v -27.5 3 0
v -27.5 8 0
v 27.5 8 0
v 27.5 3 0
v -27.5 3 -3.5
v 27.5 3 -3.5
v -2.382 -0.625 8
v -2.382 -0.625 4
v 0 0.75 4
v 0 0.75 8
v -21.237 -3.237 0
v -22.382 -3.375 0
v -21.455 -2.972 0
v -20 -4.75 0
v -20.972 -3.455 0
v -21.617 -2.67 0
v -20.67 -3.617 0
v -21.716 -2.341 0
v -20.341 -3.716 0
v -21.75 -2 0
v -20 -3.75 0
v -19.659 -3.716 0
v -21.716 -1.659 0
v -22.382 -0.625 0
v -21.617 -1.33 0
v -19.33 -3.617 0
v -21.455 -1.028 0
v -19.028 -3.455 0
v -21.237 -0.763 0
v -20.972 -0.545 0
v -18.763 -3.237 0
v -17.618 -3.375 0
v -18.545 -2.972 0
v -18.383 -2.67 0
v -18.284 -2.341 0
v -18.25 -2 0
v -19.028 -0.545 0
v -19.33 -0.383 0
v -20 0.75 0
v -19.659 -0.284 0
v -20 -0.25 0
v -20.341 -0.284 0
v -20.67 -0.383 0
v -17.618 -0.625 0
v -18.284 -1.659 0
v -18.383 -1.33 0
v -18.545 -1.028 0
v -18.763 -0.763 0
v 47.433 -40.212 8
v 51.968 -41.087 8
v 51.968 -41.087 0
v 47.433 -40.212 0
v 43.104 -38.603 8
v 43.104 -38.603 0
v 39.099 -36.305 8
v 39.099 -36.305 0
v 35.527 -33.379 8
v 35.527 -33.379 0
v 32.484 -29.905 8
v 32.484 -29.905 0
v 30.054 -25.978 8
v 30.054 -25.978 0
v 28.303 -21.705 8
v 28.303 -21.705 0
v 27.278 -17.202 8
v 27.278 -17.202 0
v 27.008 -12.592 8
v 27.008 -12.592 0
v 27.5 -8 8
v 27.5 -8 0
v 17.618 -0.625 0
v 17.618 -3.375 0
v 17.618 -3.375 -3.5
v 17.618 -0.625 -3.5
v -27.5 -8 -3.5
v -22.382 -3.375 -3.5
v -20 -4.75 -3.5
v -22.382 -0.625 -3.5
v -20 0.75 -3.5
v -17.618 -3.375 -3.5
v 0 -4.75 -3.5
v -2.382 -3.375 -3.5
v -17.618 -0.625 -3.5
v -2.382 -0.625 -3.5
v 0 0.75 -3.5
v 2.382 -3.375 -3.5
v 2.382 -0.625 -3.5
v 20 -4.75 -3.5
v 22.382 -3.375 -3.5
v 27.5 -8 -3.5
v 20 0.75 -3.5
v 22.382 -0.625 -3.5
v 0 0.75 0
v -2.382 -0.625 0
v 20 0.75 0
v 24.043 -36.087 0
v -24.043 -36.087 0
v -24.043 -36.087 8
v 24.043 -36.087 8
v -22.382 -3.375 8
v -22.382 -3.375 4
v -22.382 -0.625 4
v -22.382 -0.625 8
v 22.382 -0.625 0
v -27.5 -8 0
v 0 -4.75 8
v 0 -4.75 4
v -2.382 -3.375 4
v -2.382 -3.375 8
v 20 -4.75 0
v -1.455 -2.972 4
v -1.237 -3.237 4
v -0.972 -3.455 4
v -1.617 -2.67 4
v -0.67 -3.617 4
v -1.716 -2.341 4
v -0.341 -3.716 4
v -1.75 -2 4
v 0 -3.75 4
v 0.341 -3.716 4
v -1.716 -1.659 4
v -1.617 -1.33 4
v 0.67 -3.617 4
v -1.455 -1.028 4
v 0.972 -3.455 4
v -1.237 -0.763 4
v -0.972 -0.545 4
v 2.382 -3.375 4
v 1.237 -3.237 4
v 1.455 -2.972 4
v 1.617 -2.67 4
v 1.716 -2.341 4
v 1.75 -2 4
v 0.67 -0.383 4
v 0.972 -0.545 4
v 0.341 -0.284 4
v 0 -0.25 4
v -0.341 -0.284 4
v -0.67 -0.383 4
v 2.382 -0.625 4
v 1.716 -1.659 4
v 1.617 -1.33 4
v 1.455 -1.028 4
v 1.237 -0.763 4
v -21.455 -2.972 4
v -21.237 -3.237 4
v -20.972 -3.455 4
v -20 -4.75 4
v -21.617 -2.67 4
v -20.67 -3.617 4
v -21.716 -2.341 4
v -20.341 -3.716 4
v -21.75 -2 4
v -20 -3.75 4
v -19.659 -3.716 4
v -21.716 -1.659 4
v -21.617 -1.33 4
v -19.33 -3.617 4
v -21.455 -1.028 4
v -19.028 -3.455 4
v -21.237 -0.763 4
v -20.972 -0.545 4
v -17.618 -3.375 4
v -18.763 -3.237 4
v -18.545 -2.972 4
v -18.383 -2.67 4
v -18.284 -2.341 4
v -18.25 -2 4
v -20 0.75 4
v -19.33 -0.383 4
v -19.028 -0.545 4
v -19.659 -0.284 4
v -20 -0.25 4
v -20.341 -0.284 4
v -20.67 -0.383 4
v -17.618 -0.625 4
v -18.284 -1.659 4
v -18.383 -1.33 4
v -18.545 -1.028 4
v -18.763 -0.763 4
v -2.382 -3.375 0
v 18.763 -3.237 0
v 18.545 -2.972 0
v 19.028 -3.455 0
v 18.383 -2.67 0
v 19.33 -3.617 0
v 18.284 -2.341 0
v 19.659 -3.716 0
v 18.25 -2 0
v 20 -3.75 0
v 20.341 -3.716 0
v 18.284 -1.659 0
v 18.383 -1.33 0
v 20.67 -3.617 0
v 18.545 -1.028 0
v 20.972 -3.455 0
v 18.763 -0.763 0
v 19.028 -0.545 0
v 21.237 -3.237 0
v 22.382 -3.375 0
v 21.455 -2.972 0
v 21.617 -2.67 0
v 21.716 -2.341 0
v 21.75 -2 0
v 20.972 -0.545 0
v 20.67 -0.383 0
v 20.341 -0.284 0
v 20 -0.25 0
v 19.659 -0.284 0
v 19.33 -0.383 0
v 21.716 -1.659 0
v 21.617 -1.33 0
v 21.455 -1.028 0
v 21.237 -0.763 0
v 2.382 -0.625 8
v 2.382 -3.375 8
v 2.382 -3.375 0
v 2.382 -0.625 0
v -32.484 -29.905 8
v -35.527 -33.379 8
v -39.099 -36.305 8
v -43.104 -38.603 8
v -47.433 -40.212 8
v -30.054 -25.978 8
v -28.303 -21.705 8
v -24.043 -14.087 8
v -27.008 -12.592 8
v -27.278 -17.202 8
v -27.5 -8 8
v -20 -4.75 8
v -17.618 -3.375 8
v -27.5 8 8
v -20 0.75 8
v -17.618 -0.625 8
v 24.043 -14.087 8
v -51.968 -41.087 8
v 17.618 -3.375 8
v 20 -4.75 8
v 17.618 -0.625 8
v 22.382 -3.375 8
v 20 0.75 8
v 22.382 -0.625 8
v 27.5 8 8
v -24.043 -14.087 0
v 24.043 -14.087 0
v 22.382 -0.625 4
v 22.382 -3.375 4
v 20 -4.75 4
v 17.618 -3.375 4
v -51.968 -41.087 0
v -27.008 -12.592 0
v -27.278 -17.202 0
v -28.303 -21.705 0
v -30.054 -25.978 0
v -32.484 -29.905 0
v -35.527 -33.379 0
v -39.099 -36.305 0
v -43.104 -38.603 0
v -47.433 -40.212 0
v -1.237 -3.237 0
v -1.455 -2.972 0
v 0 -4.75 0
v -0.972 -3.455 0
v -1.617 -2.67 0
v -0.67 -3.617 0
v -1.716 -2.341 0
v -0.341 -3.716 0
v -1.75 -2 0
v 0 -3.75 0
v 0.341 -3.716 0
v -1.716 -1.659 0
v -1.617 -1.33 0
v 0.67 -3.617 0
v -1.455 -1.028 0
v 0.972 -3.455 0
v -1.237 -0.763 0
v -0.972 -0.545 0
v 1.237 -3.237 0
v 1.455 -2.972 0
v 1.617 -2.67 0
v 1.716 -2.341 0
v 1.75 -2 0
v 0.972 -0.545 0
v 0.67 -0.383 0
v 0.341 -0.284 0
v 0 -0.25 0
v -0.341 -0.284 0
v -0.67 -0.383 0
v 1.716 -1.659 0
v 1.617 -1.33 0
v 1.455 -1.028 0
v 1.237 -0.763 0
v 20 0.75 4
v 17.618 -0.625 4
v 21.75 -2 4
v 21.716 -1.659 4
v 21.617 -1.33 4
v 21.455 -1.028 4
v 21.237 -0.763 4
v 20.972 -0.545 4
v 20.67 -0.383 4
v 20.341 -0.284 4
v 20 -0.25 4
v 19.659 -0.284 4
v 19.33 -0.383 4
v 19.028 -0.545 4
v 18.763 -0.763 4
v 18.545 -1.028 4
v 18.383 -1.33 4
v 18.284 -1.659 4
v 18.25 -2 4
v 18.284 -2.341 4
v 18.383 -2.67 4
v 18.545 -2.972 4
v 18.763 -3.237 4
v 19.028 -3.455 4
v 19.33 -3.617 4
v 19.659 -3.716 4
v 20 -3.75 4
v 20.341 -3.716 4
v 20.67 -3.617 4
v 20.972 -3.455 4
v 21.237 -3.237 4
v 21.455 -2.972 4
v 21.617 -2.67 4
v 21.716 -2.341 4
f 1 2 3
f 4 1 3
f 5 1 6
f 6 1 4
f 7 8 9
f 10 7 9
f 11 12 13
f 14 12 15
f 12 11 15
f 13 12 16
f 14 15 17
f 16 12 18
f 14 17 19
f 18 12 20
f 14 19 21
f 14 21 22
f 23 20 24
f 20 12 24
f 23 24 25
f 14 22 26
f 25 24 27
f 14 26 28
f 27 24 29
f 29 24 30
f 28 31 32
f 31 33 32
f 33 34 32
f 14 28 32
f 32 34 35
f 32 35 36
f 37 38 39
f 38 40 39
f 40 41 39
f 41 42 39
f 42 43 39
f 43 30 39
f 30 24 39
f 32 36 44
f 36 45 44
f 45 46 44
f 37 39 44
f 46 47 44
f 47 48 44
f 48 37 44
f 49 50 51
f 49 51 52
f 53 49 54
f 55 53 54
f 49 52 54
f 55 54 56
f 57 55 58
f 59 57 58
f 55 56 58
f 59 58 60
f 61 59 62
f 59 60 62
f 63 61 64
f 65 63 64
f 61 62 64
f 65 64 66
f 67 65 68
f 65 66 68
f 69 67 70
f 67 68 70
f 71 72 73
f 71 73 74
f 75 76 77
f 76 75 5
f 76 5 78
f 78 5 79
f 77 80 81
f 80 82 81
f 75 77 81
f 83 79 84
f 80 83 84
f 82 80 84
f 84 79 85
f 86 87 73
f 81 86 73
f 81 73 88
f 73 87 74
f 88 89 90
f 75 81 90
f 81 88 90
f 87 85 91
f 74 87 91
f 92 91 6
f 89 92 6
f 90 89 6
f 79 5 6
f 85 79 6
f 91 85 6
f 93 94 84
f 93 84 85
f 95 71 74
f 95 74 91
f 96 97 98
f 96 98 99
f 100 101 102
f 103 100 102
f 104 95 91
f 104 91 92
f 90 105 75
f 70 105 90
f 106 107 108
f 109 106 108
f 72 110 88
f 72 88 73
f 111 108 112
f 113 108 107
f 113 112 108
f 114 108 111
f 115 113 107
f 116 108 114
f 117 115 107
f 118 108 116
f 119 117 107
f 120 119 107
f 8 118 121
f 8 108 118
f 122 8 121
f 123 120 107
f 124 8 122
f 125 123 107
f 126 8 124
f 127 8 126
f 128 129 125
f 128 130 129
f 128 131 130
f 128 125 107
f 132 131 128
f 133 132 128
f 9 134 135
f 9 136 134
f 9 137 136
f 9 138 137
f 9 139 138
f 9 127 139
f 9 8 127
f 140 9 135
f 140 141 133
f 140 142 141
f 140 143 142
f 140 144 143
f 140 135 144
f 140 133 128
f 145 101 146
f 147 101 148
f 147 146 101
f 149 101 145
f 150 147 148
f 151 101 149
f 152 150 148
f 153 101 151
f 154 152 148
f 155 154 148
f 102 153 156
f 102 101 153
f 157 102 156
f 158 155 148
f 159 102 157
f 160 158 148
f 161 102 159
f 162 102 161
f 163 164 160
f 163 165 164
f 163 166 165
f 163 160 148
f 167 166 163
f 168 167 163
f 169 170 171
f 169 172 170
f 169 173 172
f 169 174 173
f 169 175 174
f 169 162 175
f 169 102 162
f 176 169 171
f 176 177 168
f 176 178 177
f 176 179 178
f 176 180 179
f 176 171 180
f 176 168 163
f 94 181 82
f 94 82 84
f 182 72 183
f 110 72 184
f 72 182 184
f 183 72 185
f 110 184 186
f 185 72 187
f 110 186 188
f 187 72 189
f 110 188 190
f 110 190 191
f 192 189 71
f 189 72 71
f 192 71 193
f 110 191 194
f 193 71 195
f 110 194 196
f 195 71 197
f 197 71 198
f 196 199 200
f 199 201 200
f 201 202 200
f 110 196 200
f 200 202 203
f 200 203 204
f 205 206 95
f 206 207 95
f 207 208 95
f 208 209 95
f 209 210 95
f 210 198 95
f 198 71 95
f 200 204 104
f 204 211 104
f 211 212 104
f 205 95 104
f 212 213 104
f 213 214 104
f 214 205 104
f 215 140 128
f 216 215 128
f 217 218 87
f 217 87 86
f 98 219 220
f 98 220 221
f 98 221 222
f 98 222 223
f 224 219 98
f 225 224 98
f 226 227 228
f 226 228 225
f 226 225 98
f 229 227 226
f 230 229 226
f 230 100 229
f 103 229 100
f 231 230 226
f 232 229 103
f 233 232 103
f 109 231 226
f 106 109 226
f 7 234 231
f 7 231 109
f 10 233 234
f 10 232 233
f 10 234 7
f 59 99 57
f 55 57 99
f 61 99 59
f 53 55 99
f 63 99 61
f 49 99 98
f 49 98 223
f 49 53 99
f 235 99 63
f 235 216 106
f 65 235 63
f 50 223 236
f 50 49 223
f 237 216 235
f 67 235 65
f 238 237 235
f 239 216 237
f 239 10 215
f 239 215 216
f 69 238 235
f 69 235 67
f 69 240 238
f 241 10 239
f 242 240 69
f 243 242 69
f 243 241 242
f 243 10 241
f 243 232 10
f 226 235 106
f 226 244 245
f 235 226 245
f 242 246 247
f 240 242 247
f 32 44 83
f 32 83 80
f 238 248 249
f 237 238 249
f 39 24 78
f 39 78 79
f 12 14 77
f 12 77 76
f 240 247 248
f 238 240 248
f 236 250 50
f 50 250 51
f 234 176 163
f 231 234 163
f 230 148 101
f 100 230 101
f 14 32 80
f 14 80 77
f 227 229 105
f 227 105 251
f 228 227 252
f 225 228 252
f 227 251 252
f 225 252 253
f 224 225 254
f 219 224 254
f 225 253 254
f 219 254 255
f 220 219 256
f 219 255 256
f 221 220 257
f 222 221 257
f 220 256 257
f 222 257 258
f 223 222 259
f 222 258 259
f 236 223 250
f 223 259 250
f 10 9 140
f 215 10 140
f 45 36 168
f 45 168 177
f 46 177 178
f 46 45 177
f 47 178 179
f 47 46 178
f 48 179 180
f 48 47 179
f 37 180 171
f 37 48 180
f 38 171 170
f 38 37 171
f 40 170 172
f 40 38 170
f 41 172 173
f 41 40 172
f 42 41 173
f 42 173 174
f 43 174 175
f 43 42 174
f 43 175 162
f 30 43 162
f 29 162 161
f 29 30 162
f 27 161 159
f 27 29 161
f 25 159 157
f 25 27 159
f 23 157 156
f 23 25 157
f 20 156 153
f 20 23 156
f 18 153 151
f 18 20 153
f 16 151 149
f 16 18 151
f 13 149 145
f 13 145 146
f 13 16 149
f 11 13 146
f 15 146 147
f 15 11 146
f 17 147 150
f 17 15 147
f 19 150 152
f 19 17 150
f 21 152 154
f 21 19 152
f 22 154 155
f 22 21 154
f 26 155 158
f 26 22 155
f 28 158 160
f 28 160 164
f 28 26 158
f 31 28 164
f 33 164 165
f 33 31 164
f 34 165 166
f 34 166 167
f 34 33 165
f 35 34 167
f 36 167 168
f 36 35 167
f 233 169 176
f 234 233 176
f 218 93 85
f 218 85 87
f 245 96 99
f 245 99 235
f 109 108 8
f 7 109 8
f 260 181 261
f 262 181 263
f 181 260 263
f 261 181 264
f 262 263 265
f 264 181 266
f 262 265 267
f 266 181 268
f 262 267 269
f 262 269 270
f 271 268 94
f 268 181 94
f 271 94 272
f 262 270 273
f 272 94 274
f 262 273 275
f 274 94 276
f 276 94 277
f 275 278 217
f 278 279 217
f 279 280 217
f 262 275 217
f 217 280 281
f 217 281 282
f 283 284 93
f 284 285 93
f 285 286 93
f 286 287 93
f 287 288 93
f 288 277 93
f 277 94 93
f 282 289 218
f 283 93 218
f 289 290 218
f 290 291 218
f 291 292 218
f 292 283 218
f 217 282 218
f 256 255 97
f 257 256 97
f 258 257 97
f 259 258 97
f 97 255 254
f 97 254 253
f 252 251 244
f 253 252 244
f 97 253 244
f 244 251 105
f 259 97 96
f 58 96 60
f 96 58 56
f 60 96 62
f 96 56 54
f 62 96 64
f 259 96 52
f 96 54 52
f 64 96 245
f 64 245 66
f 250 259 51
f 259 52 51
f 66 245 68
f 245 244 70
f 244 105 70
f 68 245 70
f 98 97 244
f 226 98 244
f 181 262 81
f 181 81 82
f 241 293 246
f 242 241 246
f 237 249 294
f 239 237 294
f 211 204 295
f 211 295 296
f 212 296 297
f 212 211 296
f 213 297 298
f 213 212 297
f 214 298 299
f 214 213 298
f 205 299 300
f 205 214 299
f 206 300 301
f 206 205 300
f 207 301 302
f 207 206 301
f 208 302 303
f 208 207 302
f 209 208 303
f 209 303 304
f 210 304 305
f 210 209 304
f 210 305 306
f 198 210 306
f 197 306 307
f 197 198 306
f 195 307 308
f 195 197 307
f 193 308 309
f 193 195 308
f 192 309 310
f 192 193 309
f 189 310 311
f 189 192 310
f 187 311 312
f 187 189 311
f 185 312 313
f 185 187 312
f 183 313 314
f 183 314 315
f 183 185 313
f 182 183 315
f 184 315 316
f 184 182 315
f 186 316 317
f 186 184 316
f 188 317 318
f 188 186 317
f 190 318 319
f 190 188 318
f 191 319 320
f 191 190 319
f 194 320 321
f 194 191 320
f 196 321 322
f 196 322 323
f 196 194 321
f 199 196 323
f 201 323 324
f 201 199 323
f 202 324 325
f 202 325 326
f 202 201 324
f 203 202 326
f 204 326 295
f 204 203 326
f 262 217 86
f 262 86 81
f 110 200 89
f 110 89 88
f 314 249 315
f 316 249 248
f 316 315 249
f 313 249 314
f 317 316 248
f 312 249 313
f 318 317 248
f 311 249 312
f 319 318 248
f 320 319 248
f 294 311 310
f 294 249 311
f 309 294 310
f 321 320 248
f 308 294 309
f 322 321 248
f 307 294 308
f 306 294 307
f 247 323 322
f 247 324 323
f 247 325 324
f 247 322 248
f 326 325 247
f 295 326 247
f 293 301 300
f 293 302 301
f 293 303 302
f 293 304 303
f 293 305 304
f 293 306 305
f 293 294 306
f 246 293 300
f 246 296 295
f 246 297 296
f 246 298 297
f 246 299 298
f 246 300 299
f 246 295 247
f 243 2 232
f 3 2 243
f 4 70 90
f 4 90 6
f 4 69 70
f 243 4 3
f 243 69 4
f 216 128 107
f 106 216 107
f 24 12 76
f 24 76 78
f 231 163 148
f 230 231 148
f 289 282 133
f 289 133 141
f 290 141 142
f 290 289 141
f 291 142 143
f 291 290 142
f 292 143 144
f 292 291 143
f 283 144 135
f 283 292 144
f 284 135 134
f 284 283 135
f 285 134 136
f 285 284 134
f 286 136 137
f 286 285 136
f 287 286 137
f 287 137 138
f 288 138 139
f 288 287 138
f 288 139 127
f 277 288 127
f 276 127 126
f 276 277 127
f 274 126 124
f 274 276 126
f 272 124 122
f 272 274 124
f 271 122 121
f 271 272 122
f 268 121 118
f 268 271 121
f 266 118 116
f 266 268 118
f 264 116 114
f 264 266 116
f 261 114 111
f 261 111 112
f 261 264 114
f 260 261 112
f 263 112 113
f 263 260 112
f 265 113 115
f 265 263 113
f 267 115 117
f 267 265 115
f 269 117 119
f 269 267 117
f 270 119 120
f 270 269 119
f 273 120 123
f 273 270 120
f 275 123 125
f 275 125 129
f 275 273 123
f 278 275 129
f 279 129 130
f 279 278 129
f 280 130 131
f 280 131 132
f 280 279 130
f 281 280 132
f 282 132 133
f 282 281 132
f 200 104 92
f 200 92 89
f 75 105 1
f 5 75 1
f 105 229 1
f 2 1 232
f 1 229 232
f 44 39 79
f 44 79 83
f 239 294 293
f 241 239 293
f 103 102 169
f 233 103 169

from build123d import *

# Parameters (mm, degrees)
F0_W     = 55
F0_H     = 11
F0_H_2   = 5
F1_DEPTH = 8
F0_R     = 1.75
F2_DEPTH = 4
F3_DEPTH = 3.5
F0_W_2   = 48.086722
F0_H_3   = 22
F4_DEPTH = 8


with BuildPart() as f1:
    # F0 (on Top) → F1 (new body)
    with BuildSketch(Plane.XY):
        with Locations((0, -2.5)):
            Rectangle(F0_W, F0_H)
        Polygon((-22.38157, -0.625), (-20, 0.75), (-17.61843, -0.625), (-17.61843, -3.375), (-20, -4.75), (-22.38157, -3.375), align=None, mode=Mode.SUBTRACT)
        Polygon((-2.38157, -0.625), (0, 0.75), (2.38157, -0.625), (2.38157, -3.375), (0, -4.75), (-2.38157, -3.375), align=None, mode=Mode.SUBTRACT)
        Polygon((17.61843, -0.625), (20, 0.75), (22.38157, -0.625), (22.38157, -3.375), (20, -4.75), (17.61843, -3.375), align=None, mode=Mode.SUBTRACT)
        with Locations((0, 5.5)):
            Rectangle(F0_W, F0_H_2)
    extrude(amount=F1_DEPTH)

    # F0 (on Top) → F2 (join)
    with BuildSketch(Plane.XY):
        Polygon((2.38157, -0.625), (0, 0.75), (-2.38157, -0.625), (-2.38157, -3.375), (0, -4.75), (2.38157, -3.375), align=None)
        with Locations((0, -2)):
            Circle(F0_R, mode=Mode.SUBTRACT)
        Polygon((22.38157, -0.625), (20, 0.75), (17.61843, -0.625), (17.61843, -3.375), (20, -4.75), (22.38157, -3.375), align=None)
        with Locations((20, -2)):
            Circle(F0_R, mode=Mode.SUBTRACT)
        Polygon((-17.61843, -0.625), (-20, 0.75), (-22.38157, -0.625), (-22.38157, -3.375), (-20, -4.75), (-17.61843, -3.375), align=None)
        with Locations((-20, -2)):
            Circle(F0_R, mode=Mode.SUBTRACT)
    extrude(amount=F2_DEPTH)

    # F0 (on Top) → F3 (join)
    with BuildSketch(Plane.XY):
        with Locations((0, -2.5)):
            Rectangle(F0_W, F0_H)
        Polygon((-22.38157, -0.625), (-20, 0.75), (-17.61843, -0.625), (-17.61843, -3.375), (-20, -4.75), (-22.38157, -3.375), align=None, mode=Mode.SUBTRACT)
        Polygon((-2.38157, -0.625), (0, 0.75), (2.38157, -0.625), (2.38157, -3.375), (0, -4.75), (-2.38157, -3.375), align=None, mode=Mode.SUBTRACT)
        Polygon((17.61843, -0.625), (20, 0.75), (22.38157, -0.625), (22.38157, -3.375), (20, -4.75), (17.61843, -3.375), align=None, mode=Mode.SUBTRACT)
    extrude(amount=-F3_DEPTH)

    # F0 (on Top) → F4 (join)
    with BuildSketch(Plane.XY):
        with BuildLine():
            Line((27.5, -8), (-27.5, -8))
            ThreePointArc((-27.5, -8), (-32.483751, -29.904804), (-51.967503, -41.087007))
            Line((-51.967503, -41.087007), (51.967503, -41.087007))
            ThreePointArc((51.967503, -41.087007), (32.483751, -29.904804), (27.5, -8))
        make_face()
        with Locations((0, -25.087007)):
            Rectangle(F0_W_2, F0_H_3, mode=Mode.SUBTRACT)
    extrude(amount=F4_DEPTH)


solid = f1.part
